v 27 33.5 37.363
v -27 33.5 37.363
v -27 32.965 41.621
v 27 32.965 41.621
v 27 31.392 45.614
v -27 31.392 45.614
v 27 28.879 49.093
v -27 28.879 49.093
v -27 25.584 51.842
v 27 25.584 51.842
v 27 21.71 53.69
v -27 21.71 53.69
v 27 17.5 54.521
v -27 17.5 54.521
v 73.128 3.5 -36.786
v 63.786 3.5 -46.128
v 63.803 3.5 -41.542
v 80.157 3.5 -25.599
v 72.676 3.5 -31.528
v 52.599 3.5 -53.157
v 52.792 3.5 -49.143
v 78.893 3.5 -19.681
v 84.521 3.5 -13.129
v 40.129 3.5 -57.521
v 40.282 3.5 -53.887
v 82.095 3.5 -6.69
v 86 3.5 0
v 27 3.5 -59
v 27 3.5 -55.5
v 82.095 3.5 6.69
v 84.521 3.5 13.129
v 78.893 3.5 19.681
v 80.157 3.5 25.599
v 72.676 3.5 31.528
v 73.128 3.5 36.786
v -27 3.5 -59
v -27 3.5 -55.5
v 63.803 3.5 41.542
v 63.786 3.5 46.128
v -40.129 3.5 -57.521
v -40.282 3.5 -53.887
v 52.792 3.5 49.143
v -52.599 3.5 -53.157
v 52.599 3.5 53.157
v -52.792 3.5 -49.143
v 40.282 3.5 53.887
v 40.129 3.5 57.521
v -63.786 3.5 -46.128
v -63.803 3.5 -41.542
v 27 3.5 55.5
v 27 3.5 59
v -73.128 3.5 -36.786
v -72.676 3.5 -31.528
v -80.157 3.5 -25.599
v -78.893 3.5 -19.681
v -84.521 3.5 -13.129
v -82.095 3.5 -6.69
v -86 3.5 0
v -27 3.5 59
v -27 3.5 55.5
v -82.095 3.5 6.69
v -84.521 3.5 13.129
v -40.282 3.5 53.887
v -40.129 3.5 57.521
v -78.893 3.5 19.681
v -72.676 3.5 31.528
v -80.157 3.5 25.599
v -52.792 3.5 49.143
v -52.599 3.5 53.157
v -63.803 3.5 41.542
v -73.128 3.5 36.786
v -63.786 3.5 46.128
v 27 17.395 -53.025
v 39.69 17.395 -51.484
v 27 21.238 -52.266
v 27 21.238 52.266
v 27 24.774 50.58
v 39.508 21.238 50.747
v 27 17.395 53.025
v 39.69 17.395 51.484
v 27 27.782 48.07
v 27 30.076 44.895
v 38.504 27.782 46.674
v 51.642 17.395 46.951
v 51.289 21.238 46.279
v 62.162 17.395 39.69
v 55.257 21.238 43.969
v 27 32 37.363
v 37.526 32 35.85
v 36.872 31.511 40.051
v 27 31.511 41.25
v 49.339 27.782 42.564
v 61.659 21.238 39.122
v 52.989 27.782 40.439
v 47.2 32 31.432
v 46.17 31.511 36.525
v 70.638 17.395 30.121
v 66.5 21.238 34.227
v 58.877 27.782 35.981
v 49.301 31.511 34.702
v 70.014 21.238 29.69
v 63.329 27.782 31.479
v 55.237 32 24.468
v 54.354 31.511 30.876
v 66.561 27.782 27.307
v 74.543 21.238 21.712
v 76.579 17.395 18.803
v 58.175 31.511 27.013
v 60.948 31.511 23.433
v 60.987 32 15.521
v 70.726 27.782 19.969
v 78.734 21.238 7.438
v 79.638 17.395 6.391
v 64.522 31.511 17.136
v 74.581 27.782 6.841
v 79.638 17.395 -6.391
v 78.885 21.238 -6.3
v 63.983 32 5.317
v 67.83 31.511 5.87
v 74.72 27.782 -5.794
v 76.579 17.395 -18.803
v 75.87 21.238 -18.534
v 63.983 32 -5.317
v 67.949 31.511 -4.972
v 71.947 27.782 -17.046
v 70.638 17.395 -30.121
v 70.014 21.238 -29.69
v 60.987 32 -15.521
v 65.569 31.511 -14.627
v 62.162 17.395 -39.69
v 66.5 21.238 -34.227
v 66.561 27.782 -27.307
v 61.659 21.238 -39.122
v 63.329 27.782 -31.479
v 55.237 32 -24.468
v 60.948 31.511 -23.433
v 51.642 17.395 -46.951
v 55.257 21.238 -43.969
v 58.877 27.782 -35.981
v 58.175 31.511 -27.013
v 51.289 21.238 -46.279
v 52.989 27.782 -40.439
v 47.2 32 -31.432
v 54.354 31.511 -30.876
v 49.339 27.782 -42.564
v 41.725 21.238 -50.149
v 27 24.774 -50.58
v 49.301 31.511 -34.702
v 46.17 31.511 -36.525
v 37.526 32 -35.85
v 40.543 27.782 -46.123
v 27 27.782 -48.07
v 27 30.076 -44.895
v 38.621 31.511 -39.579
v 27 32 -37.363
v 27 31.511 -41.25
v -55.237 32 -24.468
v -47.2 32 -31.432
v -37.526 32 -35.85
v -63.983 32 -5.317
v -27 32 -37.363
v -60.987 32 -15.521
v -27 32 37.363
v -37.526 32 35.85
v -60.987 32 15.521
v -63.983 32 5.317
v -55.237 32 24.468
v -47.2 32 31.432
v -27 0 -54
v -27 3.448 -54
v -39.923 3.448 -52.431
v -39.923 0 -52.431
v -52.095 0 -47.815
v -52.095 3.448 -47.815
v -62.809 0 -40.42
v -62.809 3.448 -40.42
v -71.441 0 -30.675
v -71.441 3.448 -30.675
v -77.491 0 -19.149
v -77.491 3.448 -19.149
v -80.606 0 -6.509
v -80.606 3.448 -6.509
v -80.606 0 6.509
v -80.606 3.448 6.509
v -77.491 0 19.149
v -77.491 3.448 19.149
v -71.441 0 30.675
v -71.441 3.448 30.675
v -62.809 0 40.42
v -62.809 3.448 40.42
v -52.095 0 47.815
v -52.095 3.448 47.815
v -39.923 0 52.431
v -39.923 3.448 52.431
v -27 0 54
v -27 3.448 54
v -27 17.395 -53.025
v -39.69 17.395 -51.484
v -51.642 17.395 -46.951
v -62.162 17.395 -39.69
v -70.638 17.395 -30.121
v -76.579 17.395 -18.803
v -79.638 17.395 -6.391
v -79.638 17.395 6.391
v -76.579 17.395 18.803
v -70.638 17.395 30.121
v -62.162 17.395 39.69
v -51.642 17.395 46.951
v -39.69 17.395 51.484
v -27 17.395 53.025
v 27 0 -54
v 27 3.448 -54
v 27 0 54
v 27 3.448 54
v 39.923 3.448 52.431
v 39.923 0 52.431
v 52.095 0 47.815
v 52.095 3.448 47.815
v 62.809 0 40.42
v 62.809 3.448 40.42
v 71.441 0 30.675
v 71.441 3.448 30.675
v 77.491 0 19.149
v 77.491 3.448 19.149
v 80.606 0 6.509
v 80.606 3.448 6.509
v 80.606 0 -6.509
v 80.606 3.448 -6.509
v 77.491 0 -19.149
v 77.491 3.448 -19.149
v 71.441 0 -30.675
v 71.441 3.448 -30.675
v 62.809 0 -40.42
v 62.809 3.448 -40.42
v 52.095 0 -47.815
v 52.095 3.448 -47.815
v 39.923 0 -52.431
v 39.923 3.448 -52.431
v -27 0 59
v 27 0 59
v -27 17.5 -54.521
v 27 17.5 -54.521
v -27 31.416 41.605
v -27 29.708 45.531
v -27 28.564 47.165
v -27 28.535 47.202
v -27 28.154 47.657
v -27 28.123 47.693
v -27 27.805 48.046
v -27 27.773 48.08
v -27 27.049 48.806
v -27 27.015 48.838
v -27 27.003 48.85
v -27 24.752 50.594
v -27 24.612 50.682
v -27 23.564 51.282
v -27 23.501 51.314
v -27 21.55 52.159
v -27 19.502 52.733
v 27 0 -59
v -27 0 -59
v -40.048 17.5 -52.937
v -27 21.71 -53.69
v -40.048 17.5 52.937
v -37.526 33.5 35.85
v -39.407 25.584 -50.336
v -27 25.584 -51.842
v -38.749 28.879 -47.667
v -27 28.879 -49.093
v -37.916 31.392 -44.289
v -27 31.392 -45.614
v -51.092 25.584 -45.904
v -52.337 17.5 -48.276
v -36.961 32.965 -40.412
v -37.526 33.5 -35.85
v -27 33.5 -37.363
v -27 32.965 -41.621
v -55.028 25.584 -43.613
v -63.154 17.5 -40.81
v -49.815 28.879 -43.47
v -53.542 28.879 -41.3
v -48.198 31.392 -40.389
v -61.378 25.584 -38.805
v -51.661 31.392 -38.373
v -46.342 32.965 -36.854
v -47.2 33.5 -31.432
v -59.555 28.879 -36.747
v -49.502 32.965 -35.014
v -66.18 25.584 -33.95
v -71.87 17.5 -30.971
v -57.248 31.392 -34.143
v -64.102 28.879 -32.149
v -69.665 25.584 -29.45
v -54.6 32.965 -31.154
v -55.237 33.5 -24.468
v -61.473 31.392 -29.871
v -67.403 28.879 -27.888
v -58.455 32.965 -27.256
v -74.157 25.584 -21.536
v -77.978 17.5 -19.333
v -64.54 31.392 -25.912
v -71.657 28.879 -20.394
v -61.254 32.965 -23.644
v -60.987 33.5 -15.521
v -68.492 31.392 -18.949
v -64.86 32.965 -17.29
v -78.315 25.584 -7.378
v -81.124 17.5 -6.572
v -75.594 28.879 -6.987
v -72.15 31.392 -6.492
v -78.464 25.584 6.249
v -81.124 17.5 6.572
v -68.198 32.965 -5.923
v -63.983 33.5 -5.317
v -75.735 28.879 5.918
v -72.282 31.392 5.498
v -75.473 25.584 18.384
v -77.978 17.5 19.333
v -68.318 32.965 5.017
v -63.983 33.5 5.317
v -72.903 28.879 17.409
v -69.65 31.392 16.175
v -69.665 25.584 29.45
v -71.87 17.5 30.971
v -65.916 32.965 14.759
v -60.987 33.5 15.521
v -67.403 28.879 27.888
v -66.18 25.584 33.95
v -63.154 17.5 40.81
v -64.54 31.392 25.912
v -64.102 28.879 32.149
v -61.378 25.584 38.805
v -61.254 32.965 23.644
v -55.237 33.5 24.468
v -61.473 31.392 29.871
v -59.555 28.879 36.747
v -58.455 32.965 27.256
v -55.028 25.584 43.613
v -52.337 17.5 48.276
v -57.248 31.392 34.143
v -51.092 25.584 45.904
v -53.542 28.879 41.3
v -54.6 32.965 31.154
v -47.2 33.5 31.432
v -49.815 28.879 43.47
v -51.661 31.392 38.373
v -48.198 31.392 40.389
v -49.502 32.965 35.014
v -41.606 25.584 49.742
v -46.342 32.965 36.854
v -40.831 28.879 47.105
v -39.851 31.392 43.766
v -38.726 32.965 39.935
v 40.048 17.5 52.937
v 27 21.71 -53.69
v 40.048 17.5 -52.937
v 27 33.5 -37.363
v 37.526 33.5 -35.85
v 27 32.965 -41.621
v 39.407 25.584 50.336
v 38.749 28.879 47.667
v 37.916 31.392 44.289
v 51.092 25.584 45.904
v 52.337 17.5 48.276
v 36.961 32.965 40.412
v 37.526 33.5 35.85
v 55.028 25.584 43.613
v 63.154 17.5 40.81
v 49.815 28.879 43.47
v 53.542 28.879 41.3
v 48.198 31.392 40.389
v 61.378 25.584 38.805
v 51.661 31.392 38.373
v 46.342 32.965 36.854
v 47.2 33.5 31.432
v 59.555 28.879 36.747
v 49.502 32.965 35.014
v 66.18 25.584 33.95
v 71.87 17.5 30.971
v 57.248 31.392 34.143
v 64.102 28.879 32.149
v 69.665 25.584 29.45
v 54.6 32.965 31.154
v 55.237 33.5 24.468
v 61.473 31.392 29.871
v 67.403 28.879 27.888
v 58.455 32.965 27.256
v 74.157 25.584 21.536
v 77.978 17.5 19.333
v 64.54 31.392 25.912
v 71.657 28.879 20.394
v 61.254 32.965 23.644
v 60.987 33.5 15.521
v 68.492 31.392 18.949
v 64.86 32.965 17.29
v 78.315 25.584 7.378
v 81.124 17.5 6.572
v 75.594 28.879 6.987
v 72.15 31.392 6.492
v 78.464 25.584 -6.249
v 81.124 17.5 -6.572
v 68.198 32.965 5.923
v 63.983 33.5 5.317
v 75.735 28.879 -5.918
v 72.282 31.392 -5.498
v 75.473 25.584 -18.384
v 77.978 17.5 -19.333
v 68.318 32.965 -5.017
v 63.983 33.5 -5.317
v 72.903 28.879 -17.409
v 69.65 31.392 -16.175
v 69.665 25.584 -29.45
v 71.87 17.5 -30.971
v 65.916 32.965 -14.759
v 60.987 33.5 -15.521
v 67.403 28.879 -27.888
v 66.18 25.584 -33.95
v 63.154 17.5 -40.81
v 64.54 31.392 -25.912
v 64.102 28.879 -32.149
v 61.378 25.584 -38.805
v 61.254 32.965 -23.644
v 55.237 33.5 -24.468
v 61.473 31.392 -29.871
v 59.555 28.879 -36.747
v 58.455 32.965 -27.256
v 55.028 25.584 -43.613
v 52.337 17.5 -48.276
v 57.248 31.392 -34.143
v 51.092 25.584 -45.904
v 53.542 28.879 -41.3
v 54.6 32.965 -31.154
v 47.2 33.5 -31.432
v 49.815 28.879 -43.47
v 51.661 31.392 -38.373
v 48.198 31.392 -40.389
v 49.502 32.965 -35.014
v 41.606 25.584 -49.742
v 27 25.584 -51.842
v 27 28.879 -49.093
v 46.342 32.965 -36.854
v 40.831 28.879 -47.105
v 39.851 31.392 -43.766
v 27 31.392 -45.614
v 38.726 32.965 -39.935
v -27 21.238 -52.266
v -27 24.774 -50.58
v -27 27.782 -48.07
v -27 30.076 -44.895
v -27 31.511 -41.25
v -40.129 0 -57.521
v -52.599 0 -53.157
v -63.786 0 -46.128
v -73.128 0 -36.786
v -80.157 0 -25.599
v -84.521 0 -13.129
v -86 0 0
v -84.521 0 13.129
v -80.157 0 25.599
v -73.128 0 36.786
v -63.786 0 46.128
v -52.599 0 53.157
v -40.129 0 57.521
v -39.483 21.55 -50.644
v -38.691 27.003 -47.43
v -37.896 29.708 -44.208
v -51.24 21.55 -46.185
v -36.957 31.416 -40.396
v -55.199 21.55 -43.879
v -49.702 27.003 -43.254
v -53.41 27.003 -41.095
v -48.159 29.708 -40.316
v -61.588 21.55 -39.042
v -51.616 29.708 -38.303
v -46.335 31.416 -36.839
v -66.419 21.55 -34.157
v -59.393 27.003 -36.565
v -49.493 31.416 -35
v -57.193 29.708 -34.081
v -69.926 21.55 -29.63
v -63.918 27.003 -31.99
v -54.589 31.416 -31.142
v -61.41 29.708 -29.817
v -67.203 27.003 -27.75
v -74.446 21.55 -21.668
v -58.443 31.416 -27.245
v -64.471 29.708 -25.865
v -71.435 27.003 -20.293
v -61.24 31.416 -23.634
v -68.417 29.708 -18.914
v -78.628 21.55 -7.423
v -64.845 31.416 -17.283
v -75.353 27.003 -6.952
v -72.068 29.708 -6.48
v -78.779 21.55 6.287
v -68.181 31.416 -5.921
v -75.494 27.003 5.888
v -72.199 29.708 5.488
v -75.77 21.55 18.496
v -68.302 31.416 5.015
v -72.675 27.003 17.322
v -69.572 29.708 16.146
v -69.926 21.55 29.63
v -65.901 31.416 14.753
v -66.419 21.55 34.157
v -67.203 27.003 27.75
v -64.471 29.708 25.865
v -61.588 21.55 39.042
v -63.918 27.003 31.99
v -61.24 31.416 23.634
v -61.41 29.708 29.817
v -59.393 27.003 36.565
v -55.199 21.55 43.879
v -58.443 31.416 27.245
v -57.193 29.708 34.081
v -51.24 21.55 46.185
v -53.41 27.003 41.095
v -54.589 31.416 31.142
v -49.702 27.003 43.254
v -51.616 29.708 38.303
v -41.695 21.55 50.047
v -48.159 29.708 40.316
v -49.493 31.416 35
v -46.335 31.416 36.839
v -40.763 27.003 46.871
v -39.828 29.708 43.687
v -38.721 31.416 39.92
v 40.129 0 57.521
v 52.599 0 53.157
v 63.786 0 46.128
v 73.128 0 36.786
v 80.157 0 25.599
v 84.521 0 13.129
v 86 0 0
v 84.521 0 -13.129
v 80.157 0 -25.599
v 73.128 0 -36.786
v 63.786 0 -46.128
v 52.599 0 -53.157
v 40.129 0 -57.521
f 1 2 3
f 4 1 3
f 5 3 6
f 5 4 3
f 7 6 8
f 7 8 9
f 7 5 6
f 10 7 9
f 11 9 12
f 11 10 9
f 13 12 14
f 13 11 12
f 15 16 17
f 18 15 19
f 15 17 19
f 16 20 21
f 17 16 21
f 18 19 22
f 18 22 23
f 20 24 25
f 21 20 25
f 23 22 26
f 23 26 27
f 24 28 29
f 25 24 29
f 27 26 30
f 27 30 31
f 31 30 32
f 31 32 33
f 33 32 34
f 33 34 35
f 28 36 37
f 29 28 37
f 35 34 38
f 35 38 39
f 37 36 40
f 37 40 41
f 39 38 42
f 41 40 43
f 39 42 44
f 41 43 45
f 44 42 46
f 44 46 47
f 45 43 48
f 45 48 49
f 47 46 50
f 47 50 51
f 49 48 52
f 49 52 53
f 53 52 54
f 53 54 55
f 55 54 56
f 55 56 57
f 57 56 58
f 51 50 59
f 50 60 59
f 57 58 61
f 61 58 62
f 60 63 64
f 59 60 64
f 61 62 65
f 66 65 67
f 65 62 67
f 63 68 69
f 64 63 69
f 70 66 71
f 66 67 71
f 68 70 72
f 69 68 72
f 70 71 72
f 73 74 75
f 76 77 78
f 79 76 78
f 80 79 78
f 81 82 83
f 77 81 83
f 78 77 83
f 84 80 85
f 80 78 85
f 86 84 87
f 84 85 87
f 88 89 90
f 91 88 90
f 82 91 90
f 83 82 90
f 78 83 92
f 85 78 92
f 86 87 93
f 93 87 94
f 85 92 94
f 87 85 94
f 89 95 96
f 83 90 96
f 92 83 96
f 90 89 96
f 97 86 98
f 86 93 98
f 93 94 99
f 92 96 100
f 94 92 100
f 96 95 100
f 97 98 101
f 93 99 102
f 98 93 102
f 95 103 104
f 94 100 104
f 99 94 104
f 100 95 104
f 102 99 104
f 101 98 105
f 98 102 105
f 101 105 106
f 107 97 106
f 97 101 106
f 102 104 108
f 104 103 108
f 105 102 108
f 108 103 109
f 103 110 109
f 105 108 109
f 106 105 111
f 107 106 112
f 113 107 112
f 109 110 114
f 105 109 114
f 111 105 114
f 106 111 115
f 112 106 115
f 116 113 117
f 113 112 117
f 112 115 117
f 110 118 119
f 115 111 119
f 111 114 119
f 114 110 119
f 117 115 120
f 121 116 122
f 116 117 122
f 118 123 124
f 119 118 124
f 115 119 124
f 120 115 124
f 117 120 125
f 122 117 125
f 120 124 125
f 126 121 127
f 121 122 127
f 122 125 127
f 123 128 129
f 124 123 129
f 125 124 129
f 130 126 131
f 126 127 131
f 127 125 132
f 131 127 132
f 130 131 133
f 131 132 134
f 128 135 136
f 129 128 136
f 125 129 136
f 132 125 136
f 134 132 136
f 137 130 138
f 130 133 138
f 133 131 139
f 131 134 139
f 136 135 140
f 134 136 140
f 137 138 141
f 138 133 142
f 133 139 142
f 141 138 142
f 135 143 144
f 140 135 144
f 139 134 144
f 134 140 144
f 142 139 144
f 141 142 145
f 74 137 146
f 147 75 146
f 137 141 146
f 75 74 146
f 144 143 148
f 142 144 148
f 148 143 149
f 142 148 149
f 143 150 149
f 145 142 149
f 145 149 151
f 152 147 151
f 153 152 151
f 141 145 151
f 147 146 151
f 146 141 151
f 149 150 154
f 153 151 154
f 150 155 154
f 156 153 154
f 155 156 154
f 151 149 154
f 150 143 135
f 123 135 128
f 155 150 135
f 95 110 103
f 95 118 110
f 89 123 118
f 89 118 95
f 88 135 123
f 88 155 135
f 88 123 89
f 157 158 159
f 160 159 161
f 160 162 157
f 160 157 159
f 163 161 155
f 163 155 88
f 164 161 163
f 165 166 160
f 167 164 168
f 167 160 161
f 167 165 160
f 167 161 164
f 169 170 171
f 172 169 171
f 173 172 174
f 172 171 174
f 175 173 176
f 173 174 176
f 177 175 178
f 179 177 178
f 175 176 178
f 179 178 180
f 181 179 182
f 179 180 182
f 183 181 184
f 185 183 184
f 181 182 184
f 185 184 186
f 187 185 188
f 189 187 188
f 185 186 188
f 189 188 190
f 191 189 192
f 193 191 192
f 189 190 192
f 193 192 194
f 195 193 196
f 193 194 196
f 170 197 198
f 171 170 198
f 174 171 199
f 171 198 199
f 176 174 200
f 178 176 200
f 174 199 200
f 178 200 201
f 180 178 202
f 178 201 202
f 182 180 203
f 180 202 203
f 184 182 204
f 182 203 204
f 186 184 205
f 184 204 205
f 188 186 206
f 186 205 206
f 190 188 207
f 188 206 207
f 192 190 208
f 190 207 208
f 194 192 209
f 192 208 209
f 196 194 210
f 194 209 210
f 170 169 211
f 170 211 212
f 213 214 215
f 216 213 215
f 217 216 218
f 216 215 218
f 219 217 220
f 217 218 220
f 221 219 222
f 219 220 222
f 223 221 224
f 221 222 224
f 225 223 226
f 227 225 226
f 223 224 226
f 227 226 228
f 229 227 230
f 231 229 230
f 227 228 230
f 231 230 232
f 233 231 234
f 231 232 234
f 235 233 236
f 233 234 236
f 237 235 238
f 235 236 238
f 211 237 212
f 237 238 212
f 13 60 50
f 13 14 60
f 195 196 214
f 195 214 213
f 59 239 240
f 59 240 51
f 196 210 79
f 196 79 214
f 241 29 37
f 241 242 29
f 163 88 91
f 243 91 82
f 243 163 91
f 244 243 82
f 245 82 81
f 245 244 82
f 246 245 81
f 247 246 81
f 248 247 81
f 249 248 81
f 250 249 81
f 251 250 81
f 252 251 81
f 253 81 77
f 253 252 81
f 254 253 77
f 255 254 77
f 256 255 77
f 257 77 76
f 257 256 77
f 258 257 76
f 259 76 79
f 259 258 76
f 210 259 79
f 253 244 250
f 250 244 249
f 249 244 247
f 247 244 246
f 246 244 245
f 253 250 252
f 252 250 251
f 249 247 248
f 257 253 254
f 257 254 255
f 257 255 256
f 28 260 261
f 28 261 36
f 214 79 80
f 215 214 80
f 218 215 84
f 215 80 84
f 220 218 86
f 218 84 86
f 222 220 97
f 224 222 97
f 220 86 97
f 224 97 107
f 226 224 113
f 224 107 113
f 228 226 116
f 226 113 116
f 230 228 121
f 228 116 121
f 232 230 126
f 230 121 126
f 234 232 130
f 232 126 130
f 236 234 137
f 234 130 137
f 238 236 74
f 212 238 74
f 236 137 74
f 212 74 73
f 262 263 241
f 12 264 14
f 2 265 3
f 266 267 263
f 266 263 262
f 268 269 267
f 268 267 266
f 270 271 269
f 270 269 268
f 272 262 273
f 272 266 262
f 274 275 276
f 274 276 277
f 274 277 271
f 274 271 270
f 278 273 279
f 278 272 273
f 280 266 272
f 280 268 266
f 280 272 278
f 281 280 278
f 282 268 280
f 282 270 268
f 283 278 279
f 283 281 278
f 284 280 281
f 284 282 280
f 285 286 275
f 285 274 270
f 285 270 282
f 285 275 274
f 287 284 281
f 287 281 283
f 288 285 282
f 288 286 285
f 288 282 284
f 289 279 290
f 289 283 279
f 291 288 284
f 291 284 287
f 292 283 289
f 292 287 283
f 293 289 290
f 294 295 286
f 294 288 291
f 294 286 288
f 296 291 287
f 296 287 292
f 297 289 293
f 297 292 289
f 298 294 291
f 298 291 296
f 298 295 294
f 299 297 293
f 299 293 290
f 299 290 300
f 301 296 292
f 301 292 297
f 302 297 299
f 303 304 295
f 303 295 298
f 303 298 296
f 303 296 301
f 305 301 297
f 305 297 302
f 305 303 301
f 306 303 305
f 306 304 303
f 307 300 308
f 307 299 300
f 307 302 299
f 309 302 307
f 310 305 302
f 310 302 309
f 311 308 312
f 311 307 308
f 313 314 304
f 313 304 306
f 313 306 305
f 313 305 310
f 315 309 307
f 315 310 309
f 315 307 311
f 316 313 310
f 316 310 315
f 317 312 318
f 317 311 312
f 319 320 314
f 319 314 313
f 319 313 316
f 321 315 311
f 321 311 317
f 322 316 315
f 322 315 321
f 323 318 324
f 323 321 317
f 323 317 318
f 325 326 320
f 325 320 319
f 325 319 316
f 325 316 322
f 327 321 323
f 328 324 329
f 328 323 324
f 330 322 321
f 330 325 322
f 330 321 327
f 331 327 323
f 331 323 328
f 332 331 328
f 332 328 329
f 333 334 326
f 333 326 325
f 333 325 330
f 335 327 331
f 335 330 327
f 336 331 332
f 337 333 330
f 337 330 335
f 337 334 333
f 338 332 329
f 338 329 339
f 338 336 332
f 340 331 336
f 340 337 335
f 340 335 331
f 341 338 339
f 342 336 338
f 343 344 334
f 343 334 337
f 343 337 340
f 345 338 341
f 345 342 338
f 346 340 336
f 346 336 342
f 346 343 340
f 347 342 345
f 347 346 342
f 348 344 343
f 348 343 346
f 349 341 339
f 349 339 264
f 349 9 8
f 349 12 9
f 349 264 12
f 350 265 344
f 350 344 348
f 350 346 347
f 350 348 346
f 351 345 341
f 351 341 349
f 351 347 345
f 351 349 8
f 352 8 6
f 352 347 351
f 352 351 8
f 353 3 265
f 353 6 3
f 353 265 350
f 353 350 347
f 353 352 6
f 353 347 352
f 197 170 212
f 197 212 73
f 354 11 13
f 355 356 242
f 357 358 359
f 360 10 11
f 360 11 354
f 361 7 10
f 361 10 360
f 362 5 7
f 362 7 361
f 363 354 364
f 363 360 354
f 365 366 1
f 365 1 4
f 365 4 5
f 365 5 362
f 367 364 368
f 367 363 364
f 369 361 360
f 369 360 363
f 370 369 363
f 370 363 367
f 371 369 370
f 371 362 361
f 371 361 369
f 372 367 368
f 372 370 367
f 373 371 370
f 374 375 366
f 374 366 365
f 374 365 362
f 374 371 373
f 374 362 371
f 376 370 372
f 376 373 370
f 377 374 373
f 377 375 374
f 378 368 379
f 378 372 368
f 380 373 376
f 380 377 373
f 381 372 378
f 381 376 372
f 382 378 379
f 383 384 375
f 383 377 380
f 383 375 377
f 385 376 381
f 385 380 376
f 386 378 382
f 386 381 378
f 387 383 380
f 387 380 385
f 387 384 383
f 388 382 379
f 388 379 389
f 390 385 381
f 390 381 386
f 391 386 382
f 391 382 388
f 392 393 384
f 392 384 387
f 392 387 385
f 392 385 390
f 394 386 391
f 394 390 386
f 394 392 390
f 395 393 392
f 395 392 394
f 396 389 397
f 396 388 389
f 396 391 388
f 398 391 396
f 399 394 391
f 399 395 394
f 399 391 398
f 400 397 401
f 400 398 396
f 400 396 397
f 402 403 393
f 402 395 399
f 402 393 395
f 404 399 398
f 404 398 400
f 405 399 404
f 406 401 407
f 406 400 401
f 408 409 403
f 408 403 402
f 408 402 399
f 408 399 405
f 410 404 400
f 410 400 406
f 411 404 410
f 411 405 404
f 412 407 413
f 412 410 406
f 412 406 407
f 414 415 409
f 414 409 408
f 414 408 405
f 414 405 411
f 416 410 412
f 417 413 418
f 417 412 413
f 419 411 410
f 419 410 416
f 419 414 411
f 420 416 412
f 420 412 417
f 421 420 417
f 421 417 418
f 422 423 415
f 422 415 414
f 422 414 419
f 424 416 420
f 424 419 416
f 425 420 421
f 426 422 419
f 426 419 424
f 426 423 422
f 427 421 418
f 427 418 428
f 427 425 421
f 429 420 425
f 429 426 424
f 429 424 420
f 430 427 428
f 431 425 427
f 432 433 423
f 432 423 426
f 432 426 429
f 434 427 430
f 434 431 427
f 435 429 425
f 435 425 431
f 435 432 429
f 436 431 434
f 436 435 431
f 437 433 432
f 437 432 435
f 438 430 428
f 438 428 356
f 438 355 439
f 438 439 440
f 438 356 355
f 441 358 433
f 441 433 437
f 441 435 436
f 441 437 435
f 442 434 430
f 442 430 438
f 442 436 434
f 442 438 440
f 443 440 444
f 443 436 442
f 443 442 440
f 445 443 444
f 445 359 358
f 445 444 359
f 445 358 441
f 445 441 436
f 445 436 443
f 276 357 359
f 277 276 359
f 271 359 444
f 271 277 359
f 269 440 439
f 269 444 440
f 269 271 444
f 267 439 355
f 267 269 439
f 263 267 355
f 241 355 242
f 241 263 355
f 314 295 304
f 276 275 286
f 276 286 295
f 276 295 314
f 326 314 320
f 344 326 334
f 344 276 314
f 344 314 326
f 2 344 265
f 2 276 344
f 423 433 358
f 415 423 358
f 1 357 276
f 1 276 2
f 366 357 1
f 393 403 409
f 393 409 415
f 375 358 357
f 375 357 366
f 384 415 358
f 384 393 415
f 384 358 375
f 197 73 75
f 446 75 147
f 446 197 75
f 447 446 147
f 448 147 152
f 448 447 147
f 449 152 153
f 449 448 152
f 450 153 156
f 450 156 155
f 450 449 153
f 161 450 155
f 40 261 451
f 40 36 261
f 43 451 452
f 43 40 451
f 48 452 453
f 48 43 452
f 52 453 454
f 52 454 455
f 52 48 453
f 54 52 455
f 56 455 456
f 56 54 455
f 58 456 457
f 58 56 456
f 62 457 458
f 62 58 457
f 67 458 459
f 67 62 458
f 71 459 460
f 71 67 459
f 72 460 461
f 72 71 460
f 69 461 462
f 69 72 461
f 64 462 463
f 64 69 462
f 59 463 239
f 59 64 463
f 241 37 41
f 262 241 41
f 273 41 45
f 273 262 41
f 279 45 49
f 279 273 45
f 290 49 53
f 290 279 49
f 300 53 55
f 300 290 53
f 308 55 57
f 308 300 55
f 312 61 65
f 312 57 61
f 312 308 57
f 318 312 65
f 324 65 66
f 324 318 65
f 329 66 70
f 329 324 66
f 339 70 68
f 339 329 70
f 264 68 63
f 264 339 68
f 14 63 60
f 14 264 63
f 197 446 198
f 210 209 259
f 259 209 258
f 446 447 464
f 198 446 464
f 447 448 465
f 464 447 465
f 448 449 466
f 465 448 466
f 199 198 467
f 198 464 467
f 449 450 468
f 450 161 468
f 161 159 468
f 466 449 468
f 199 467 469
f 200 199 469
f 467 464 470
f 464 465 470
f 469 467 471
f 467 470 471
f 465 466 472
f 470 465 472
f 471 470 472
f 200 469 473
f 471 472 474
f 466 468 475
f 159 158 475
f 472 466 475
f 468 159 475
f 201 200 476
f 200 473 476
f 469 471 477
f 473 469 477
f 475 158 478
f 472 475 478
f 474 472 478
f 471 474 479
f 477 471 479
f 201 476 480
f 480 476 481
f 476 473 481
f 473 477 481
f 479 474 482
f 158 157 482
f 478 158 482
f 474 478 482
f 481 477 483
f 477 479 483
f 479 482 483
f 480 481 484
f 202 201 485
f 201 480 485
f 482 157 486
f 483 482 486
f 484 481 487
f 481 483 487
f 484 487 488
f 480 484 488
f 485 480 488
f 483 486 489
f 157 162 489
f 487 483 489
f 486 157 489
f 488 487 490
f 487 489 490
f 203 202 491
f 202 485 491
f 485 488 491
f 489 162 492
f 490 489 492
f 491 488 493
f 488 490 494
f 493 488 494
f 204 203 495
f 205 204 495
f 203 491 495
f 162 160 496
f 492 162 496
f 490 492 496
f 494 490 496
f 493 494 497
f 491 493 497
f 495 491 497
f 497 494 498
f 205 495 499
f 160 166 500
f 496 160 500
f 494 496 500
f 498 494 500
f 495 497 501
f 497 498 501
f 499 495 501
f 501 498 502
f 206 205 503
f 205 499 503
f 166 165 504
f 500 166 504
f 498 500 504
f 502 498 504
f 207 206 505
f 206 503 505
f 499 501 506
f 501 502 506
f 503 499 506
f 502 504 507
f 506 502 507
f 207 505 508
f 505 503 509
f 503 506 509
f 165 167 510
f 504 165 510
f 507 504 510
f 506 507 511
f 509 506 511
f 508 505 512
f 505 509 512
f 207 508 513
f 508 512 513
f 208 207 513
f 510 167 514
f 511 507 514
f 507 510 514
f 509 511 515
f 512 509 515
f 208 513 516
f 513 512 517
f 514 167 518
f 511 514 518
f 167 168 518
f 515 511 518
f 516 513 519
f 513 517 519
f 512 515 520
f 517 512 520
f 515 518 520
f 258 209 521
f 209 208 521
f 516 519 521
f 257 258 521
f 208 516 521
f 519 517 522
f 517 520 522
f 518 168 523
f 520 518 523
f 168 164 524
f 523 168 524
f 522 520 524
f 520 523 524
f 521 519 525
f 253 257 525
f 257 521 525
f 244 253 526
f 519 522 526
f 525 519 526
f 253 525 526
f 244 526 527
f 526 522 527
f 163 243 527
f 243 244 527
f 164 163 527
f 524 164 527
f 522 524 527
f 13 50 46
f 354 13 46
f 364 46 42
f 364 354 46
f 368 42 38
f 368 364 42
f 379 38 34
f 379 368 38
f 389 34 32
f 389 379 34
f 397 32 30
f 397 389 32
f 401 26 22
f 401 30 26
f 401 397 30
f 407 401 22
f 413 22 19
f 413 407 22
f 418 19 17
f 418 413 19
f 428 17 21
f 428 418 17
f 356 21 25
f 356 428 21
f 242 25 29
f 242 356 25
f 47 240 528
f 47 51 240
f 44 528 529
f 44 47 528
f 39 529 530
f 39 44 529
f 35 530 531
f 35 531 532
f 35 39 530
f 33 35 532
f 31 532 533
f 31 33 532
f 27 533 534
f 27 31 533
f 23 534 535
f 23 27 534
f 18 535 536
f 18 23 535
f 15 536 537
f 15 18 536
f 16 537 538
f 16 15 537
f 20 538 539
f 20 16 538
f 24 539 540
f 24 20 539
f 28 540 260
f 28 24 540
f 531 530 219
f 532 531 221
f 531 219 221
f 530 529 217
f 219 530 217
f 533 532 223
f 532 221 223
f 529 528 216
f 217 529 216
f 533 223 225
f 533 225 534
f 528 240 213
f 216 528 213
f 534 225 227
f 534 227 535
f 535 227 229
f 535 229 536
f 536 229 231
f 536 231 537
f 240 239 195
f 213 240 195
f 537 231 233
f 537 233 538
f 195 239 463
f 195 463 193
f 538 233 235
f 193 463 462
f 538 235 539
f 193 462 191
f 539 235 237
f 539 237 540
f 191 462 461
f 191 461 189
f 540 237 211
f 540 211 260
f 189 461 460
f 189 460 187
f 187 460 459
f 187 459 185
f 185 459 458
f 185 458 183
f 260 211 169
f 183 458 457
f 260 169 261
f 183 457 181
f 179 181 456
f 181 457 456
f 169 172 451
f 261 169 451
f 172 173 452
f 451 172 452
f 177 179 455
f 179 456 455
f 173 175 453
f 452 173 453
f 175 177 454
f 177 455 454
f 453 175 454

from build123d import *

# Parameters (mm, degrees)
BOSS_EXTRUDE1_DEPTH = 3.5
BOSS_EXTRUDE2_DEPTH = 30
BOSS_EXTRUDE2_TAPER = 4
SHELL1_START        = -27
SHELL1_DEPTH        = 54
SKETCH9_W           = 3.5
SKETCH9_H           = 3.5


with BuildPart() as part:
    # Sketch1 → Boss-Extrude1 (new body)
    with BuildSketch(Plane(origin=(0, 0, 0), x_dir=(1, 0, 0), z_dir=(0, 1, 0))):
        with BuildLine():
            Line((-27, 55.5), (27, 55.5))
            ThreePointArc((27, 55.5), (82.5, 0), (27, -55.5))
            Line((27, -55.5), (-27, -55.5))
            ThreePointArc((-27, -55.5), (-82.5, 0), (-27, 55.5))
        make_face()
    extrude(amount=BOSS_EXTRUDE1_DEPTH)

    # Sketch6 → Boss-Extrude2 (add)
    with BuildSketch(Plane(origin=(0, 3.5, 0), x_dir=(1, 0, 0), z_dir=(0, 1, 0))):
        with BuildLine():
            Line((-27, -55.5), (27, -55.5))
            ThreePointArc((27, -55.5), (82.5, 0), (27, 55.5))
            Line((27, 55.5), (-27, 55.5))
            ThreePointArc((-27, 55.5), (-82.5, 0), (-27, -55.5))
        make_face()
    extrude(amount=BOSS_EXTRUDE2_DEPTH, taper=BOSS_EXTRUDE2_TAPER)

    # Cut-Sweep5: sweep along a path in Sketch8
    with BuildLine(Plane(origin=(0, 33.5, 0), x_dir=(1, 0, 0), z_dir=(0, 1, 0))) as cut_sweep5_path:
        Line((-27, -53.402195642), (27, -53.402195642))
        ThreePointArc((27, -53.402195642), (80.402195642, 0), (27, 53.402195642))
        Line((27, 53.402195642), (-27, 53.402195642))
        ThreePointArc((-27, 53.402195642), (-80.402195642, 0), (-27, -53.402195642))
    # Sketch7 → Cut-Sweep5 (sweep, cut)
    with BuildSketch(Plane(origin=(0, 0, 0), x_dir=(0, 0, -1), z_dir=(1, 0, 0))):
        with BuildLine():
            Line((37.363125272, 33.5), (37.363125272, 41.316863161))
            Line((37.363125272, 41.316863161), (63.973400916, 41.316863161))
            Line((63.973400916, 41.316863161), (63.973400916, 17.5))
            Line((63.973400916, 17.5), (54.521024633, 17.5))
            ThreePointArc((54.521024633, 17.5), (49.093358758, 28.879338149), (37.363125272, 33.5))
        make_face()
    sweep(path=cut_sweep5_path.line, mode=Mode.SUBTRACT)

    # Shell1: read off the stored shape, not the designer's step
    # Shell1 outline → Shell1 (cut)
    with BuildSketch(Plane.YZ.offset(SHELL1_START)):
        with BuildLine():
            ThreePointArc((32, 37.363125272), (27.782307596, 48.070361217), (17.395365289, 53.024678557))
            Line((17.395365289, 53.024678557), (3.447618846, 54))
            Line((3.447618846, 54), (0, 54))
            Line((0, 54), (0, -54))
            Line((0, -54), (3.447618846, -54))
            Line((3.447618846, -54), (17.395365289, -53.024678557))
            ThreePointArc((17.395365289, -53.024678557), (27.782307596, -48.070361217), (32, -37.363125272))
            Line((32, -37.363125272), (32, 37.363125272))
        make_face()
    extrude(amount=SHELL1_DEPTH, mode=Mode.SUBTRACT)

    # Shell1 2 outline → Shell1 2 (revolve, cut)
    with BuildSketch(Plane(origin=(-27, 0, 0), x_dir=(1, 0, 0), z_dir=(0, 0, 1))):
        with BuildLine():
            Line((54, 3.447618846), (53.024678557, 17.395365289))
            ThreePointArc((53.024678557, 17.395365289), (48.070361217, 27.782307596), (37.363125272, 32))
            Line((37.363125272, 32), (0, 32))
            Line((0, 32), (0, 0))
            Line((0, 0), (54, 0))
            Line((54, 0), (54, 3.447618846))
        make_face()
    revolve(axis=Axis((-27, 0, 0), (0, 1, 0)), mode=Mode.SUBTRACT)

    # Shell1 3 outline → Shell1 3 (revolve, cut)
    with BuildSketch(Plane(origin=(27, 0, 0), x_dir=(1, 0, 0), z_dir=(0, 0, 1))):
        with BuildLine():
            Line((54, 3.447618846), (53.024678557, 17.395365289))
            ThreePointArc((53.024678557, 17.395365289), (48.070361217, 27.782307596), (37.363125272, 32))
            Line((37.363125272, 32), (0, 32))
            Line((0, 32), (0, 0))
            Line((0, 0), (54, 0))
            Line((54, 0), (54, 3.447618846))
        make_face()
    revolve(axis=Axis((27, 0, 0), (0, 1, 0)), mode=Mode.SUBTRACT)

    # Sweep1: sweep along a path in Sketch10
    with BuildLine(Plane.XZ) as sweep1_path:
        Line((27, -55.5), (-27, -55.5))
        ThreePointArc((-27, -55.5), (-82.5, 0), (-27, 55.5))
        Line((-27, 55.5), (27, 55.5))
        ThreePointArc((27, 55.5), (82.5, 0), (27, -55.5))
    # Sketch9 → Sweep1 (sweep)
    with BuildSketch(Plane(origin=(0, 0, 0), x_dir=(0, 0, -1), z_dir=(1, 0, 0))):
        with Locations((57.25, 1.75)):
            Rectangle(SKETCH9_W, SKETCH9_H)
    sweep(path=sweep1_path.line)


solid = part.part
